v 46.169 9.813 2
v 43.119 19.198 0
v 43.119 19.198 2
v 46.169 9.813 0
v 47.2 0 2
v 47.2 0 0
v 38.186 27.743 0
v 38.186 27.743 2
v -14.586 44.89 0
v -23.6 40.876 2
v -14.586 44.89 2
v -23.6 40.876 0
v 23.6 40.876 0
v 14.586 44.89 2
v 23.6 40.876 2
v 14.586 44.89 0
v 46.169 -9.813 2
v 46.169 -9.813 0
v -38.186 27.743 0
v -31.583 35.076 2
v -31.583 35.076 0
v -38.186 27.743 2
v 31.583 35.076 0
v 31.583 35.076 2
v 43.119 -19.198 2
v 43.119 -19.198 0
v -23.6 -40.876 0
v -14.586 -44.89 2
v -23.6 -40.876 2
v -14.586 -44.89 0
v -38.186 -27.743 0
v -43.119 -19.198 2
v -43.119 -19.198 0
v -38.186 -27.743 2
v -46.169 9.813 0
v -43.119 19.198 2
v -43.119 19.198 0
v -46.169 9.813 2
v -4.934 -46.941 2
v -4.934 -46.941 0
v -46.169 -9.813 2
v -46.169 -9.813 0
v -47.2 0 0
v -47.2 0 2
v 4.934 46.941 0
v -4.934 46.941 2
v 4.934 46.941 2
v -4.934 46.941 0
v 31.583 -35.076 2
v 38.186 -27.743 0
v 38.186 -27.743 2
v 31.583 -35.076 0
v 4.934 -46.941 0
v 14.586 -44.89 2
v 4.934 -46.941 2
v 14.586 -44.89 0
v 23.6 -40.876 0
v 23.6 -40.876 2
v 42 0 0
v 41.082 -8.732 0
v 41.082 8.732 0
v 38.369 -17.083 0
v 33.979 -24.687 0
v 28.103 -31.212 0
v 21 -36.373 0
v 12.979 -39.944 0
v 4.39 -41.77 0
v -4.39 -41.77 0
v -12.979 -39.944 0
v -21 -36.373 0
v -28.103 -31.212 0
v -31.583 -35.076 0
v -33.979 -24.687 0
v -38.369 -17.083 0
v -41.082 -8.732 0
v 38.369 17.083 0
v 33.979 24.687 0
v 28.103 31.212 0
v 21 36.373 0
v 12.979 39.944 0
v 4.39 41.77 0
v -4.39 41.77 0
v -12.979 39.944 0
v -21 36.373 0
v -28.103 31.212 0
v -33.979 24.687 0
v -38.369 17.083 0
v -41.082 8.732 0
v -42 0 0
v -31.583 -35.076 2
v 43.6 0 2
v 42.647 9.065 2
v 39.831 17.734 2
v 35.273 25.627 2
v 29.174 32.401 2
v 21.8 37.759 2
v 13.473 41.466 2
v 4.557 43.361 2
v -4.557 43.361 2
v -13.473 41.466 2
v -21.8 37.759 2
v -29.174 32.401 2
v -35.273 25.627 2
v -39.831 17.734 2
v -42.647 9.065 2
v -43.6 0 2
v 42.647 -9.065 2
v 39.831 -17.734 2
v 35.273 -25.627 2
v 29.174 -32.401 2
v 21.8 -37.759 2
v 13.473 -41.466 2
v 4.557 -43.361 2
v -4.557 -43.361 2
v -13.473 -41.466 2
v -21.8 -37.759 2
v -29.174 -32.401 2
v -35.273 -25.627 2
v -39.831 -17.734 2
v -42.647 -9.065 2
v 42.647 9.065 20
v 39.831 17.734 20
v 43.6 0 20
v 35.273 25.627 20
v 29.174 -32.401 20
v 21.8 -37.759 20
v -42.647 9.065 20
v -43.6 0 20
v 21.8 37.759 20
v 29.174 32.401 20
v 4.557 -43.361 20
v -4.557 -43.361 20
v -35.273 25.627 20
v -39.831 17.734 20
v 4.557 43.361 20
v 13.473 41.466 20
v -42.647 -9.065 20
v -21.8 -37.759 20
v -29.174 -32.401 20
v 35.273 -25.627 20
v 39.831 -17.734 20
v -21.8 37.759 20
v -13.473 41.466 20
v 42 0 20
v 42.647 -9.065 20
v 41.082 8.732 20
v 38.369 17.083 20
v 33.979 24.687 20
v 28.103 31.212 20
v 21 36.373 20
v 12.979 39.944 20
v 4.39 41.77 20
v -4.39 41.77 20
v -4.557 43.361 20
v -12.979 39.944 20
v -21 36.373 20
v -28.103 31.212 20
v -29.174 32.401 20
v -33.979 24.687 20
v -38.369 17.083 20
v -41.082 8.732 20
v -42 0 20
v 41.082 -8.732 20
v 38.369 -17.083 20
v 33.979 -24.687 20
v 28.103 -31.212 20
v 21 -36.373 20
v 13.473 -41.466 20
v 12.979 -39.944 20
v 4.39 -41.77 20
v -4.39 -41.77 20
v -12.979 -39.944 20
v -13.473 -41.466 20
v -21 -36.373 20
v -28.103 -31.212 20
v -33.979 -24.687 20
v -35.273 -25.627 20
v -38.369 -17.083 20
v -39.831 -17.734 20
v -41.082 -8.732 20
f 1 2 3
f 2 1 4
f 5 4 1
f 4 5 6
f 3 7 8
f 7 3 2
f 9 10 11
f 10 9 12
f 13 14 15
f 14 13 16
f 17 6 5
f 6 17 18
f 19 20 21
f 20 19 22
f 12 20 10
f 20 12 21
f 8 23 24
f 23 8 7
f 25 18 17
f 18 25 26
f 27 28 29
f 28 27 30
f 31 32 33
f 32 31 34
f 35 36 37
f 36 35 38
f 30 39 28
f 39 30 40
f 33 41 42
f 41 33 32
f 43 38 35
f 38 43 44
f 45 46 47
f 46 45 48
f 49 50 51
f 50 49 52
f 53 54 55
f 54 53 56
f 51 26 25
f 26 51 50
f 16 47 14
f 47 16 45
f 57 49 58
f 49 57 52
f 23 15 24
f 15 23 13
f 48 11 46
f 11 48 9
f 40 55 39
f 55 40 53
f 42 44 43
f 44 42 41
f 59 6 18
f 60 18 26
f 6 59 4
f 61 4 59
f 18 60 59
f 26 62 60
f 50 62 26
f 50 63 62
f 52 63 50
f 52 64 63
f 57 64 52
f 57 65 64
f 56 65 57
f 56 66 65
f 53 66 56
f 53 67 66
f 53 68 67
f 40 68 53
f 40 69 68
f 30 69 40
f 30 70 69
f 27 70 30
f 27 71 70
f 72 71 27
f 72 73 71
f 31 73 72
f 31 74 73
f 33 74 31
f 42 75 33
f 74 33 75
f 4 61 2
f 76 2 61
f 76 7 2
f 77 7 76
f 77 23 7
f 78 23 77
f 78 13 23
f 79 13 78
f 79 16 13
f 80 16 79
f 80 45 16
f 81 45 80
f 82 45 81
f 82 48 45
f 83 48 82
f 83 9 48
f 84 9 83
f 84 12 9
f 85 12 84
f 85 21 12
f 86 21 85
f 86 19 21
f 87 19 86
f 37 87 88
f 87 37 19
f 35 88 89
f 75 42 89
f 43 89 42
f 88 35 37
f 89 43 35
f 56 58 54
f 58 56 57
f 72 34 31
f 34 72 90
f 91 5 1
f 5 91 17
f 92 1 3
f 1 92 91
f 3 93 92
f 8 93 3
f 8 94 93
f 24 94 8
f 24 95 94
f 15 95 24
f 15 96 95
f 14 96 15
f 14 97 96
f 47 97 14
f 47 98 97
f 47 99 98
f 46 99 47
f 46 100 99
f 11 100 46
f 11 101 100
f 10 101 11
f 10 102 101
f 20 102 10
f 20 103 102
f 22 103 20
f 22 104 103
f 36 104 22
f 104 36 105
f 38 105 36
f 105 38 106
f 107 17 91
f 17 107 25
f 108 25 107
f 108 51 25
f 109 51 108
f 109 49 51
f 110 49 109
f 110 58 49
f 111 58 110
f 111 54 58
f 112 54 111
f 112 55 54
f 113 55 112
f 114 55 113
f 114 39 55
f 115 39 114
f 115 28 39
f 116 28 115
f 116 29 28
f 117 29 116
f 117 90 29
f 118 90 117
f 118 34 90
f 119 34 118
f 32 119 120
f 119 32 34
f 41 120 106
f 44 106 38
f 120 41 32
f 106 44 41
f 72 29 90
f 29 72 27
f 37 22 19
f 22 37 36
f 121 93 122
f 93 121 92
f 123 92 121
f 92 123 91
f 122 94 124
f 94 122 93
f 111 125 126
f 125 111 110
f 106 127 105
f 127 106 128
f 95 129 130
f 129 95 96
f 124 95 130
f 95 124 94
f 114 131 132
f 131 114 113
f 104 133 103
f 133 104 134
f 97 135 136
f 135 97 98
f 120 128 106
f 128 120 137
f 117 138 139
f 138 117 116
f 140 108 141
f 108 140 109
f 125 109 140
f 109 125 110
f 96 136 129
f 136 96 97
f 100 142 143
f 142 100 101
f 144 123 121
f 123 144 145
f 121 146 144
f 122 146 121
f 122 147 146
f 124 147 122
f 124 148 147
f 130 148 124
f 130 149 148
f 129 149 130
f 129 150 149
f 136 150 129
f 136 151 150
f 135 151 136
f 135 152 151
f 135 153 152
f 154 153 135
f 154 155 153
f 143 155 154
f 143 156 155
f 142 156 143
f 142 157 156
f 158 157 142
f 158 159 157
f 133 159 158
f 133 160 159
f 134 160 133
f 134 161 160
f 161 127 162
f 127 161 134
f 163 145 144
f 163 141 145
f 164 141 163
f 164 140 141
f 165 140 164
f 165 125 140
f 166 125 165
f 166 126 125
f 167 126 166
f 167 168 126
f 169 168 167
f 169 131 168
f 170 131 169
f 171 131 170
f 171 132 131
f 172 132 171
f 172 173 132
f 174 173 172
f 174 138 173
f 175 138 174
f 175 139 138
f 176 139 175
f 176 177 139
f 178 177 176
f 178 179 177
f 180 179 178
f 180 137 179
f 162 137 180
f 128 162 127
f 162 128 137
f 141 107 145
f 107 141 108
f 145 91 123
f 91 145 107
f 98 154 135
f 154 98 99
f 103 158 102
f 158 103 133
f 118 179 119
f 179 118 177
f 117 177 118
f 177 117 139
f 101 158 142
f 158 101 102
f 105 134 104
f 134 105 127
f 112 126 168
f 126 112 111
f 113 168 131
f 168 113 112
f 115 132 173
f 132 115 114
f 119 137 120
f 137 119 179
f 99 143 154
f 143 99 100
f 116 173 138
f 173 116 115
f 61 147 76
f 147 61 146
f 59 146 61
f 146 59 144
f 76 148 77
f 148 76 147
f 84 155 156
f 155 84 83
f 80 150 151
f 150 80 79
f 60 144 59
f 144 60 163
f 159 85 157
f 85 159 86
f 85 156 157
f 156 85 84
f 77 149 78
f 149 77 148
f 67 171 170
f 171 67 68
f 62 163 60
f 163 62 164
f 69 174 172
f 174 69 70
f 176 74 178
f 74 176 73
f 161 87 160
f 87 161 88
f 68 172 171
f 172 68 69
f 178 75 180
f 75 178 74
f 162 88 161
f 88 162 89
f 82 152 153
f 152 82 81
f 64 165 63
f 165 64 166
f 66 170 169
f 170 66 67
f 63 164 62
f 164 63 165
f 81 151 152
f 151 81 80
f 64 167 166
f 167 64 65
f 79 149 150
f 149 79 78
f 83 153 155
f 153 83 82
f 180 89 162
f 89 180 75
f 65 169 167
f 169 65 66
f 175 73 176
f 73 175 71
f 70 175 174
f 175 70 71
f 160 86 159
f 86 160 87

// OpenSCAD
//$fa=4; // default minimum facet angle is now 0.5
$fs=0.05; // default minimum facet size is now 0.05 mm

height = 20;
radius = 42;
wallThickness = 1.6;
rimThickness = 3.6;
rimHeight = 2;

difference() {
  union() {
    cylinder(r = (radius + rimThickness + wallThickness), h = rimHeight);
    cylinder(r = radius + wallThickness, h = height);
  }

  translate([0, 0, -.1]) cylinder(r = radius, h = height + .2);
}
